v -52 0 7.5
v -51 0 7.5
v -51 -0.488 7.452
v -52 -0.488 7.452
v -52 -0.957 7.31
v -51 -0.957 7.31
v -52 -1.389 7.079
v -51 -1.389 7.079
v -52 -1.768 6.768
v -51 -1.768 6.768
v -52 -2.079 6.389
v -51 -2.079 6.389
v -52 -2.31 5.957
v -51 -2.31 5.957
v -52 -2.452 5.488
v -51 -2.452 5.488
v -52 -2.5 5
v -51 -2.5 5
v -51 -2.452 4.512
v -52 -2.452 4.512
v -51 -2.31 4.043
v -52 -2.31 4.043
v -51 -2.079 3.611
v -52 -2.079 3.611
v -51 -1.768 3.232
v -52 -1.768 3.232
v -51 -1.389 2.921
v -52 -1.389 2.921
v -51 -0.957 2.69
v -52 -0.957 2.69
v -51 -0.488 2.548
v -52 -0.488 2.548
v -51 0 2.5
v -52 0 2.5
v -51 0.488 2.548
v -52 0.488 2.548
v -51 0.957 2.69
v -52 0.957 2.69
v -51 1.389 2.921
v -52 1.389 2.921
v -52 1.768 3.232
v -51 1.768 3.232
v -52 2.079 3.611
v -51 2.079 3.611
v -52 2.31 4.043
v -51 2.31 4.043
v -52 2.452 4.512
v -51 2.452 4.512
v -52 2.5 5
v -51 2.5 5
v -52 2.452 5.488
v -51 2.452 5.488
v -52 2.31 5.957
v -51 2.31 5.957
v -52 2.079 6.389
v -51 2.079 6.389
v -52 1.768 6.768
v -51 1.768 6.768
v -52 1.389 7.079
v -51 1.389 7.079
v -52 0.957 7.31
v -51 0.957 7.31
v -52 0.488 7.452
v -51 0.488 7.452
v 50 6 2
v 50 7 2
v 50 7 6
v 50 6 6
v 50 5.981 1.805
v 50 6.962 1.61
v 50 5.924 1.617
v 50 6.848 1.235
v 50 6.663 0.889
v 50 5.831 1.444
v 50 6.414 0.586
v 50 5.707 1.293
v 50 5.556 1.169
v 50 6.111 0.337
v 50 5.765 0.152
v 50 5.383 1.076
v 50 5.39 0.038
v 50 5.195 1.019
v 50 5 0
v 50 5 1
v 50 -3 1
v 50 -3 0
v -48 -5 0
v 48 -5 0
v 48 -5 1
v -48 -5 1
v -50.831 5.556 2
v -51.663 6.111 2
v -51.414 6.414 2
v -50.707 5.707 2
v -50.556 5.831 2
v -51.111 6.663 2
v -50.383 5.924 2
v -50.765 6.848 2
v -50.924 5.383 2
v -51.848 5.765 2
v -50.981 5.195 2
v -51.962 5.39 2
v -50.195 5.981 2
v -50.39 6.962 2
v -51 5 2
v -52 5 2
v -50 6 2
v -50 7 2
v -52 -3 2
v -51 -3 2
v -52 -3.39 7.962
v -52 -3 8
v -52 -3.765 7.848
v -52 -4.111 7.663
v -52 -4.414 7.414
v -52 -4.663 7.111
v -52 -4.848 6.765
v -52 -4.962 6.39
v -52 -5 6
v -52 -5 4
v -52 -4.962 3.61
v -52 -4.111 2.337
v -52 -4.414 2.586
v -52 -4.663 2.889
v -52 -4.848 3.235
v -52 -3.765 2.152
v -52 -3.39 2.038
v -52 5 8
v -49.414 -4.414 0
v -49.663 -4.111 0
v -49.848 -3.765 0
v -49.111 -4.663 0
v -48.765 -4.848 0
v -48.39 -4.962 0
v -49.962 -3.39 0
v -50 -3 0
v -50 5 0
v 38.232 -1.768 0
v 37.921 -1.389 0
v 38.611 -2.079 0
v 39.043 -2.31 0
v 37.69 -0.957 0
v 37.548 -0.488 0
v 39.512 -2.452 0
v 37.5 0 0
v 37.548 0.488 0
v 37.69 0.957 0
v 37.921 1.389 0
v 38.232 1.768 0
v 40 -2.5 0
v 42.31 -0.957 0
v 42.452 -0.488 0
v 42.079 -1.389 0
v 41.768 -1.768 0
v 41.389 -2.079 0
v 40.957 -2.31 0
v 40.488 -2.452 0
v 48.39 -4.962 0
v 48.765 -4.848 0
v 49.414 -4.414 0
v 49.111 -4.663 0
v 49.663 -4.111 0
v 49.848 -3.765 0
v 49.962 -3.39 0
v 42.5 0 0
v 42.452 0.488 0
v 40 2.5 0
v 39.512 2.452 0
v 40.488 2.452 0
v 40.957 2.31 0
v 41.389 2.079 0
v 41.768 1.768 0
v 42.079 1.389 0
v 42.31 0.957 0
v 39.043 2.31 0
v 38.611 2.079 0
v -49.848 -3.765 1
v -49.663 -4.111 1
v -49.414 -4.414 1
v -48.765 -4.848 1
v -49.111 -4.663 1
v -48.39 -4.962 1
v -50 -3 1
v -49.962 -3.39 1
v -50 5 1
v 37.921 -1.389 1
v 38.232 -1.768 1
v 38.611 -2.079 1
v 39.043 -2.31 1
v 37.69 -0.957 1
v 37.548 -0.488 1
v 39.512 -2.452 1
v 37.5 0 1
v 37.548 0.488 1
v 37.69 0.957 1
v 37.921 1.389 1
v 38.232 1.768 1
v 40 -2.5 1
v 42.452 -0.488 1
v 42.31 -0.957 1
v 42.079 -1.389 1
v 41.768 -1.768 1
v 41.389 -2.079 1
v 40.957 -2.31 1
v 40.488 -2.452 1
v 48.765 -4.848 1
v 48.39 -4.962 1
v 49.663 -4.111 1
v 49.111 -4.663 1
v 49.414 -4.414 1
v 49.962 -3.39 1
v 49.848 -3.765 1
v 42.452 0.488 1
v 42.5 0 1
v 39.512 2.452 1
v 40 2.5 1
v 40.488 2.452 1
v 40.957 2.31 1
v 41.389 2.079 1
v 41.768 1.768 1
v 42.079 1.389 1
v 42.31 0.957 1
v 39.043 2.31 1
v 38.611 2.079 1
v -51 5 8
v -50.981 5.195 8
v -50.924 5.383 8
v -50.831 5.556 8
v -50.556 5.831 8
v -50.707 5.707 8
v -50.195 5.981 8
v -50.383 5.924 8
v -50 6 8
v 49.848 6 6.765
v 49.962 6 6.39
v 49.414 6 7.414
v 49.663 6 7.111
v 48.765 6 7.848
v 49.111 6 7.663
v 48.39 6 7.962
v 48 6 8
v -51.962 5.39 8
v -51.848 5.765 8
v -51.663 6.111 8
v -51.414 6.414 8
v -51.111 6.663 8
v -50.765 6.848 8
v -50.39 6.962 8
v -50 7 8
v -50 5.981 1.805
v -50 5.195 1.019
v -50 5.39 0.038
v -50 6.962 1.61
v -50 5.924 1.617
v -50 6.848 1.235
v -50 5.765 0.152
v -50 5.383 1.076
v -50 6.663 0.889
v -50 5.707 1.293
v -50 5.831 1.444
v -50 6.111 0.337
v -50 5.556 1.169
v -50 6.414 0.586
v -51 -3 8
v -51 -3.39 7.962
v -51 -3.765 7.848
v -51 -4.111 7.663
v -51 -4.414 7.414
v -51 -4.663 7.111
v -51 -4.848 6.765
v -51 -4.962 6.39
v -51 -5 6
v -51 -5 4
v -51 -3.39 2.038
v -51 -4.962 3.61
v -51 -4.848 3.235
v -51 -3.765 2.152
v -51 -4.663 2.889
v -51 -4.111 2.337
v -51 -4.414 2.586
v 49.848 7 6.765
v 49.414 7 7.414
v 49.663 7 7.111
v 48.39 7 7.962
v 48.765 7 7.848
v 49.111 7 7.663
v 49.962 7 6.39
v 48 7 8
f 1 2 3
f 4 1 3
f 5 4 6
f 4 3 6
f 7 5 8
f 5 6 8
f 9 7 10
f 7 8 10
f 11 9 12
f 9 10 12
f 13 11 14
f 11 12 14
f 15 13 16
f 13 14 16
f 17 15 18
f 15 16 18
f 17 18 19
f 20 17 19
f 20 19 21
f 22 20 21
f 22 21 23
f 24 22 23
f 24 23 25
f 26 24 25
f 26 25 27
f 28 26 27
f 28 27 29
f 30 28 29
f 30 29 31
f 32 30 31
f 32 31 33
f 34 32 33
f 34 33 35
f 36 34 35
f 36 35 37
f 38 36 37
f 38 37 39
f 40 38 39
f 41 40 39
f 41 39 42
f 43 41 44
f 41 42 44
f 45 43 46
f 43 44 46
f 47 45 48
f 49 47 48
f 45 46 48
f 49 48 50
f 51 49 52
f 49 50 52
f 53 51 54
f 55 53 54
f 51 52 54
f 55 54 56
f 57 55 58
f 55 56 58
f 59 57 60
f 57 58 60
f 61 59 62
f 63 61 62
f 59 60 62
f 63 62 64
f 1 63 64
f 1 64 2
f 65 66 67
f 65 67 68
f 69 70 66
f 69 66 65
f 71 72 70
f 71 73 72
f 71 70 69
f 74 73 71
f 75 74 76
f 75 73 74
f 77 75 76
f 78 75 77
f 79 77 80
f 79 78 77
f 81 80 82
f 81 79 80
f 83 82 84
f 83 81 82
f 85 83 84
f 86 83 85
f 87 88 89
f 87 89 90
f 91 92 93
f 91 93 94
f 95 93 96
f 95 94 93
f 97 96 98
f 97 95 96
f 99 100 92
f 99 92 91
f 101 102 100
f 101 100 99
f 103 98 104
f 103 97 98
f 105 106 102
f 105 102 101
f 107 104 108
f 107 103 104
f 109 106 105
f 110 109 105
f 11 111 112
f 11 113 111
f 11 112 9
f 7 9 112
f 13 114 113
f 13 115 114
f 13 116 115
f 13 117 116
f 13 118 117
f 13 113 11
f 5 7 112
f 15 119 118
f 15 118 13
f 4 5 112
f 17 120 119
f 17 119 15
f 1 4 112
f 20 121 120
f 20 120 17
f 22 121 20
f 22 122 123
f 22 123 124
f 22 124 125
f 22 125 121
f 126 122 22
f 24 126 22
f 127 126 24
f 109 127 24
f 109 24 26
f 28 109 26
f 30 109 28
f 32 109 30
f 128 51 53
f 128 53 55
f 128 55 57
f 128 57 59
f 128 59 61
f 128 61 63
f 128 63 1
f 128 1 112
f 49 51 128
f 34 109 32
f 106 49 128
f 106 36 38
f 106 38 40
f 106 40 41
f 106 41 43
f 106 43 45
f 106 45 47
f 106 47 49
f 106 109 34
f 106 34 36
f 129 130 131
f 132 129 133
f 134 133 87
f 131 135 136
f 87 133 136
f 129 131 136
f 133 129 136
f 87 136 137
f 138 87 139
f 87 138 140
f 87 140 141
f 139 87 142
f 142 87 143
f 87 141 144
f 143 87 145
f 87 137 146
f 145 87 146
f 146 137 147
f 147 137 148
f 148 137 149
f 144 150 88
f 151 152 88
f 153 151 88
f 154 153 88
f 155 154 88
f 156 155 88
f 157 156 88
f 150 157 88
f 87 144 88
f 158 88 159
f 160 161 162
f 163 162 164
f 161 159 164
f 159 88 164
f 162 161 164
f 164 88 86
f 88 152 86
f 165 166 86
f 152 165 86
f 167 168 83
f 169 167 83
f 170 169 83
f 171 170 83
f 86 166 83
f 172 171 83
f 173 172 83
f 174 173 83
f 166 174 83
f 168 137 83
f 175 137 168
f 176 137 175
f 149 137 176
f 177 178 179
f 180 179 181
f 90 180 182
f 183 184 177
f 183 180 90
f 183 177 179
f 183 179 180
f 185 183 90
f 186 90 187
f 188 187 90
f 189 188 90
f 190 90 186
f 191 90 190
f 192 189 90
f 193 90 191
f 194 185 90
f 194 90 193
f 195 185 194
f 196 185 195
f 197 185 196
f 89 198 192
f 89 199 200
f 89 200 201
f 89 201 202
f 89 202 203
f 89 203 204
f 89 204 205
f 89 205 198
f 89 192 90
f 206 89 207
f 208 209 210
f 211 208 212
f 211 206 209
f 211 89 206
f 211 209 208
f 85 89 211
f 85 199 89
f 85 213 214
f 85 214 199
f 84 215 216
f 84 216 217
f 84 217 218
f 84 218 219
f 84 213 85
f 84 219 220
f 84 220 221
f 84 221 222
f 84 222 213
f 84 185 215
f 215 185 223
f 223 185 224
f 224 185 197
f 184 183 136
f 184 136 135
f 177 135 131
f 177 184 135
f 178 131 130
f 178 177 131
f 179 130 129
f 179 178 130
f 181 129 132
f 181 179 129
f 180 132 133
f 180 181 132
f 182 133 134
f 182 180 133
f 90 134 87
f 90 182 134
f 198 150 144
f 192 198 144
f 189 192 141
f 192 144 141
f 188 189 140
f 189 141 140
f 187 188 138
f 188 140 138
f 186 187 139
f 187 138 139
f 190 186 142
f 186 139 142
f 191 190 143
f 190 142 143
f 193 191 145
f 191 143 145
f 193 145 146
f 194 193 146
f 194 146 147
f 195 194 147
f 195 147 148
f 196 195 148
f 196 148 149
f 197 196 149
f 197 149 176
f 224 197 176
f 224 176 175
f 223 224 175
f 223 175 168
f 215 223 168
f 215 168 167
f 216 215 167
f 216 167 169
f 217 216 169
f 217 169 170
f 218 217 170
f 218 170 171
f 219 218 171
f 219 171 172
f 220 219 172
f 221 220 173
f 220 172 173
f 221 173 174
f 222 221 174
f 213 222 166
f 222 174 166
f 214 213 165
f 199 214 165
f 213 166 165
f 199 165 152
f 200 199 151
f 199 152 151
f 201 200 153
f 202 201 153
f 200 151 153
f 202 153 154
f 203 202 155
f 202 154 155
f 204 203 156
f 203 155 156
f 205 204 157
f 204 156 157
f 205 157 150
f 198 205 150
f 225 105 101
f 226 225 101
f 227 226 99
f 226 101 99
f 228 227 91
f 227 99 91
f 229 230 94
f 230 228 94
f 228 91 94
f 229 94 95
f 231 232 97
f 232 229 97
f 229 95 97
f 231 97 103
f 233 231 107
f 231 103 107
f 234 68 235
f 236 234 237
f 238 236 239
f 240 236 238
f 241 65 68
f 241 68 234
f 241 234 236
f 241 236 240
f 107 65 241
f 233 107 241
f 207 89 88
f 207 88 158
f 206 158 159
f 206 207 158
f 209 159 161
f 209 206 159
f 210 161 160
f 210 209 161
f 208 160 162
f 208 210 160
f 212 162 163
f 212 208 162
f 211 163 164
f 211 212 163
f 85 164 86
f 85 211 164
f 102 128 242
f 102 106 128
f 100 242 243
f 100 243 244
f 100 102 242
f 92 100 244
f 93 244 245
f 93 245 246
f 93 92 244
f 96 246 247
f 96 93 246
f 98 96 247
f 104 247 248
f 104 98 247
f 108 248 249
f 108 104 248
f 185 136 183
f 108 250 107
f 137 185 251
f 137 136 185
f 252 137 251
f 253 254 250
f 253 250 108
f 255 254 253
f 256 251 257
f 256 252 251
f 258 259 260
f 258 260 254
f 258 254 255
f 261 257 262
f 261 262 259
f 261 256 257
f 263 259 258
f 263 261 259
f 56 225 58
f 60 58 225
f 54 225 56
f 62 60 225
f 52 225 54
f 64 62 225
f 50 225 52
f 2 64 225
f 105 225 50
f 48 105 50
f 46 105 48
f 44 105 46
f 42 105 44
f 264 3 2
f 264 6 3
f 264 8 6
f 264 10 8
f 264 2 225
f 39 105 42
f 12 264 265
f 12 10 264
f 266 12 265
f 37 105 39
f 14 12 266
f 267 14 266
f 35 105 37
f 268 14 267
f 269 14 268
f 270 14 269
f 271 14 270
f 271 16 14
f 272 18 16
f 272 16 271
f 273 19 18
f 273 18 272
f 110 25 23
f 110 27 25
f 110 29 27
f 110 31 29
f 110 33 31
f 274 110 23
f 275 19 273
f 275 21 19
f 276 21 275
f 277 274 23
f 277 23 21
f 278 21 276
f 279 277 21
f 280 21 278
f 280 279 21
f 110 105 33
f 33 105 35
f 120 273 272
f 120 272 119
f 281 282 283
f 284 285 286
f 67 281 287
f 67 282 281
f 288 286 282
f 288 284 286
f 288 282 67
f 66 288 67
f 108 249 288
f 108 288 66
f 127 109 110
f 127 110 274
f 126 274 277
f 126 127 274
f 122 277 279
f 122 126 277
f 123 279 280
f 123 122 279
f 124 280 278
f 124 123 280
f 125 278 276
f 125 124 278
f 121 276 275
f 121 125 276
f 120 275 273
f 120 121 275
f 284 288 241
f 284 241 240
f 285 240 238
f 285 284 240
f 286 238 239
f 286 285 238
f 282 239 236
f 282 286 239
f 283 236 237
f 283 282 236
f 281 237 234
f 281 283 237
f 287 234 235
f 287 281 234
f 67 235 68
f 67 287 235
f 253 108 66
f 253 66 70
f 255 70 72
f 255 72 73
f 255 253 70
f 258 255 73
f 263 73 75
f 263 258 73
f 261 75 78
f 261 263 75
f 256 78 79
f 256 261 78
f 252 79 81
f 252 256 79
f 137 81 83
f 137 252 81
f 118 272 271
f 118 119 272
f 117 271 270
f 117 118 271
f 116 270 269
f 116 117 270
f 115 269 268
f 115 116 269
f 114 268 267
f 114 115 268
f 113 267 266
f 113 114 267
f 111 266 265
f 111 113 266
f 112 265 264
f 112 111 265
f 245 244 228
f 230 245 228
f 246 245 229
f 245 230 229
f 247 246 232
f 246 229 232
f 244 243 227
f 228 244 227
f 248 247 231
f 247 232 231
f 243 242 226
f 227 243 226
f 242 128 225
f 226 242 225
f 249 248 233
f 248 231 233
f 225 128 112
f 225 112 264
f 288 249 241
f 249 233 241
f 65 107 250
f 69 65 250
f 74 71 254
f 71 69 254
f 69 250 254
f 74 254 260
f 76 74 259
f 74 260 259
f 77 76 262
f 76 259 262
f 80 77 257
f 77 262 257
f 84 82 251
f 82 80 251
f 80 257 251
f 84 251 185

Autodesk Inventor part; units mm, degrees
ref_plane "YZ Plane" through (0, 0, 0) normal (1, 0, 0) x (0, 1, 0)
ref_plane "XZ Plane" through (0, 0, 0) normal (0, 1, 0) x (-1, 0, 0)
ref_plane "XY Plane" through (0, 0, 0) normal (0, 0, 1) x (1, 0, 0)
sketch "Schizzo9" plane through (0, 0, 0) normal (0, 0, 1) x (1, 0, 0)
  line L0 (-50, 5) -> (50, 5)
  line L1 (50, 5) -> (50, -5)
  line L2 (50, -5) -> (-50, -5)
  line L3 (-50, -5) -> (-50, 5)
  line L4 (-50, 5) -> (50, -5) construction
  line L5 (50, 5) -> (-50, -5) construction
  point P0 (0, 0)
  dimension "d87" = 100
  dimension "d88" = 10
extrude "Piano6" add sketch "Schizzo9" along normal blind 1
sketch "Schizzo19" plane through (-50, 6, 2) normal (0, 1, 0) x (-1, 0, 0)
  line L0 (-100, 0) -> (0, 0)
  line L1 (0, 0) -> (0, 6)
  line L2 (0, 6) -> (-100, 6)
  line L3 (-100, 6) -> (-100, 0)
edge flange "Flangia9" height 8 angle 90 thickness 1 bend radius 1 thickness toward (0, 1, 0) relief tear relief width 1 relief depth 0.5 edges at (0, 5, 1) wall of the first edge with corners at (50, 6, 2) (-50, 6, 2) (-50, 6, 8) (50, 6, 8)
bend "Piega (Bend)9"
corner "Angolo9"
sketch "Schizzo20" plane through (-51, 5, 2) normal (-1, 0, 0) x (0, -1, 0)
  line L0 (0, 6) -> (0, 0)
  line L1 (0, 0) -> (10, 0)
  line L2 (10, 0) -> (10, 6)
  line L3 (10, 6) -> (0, 6)
edge flange "Flangia10" height 12 angle 90 thickness 1 bend radius 1 thickness toward (-1, 0, 0) relief tear relief width 1 relief depth 0.5 edges at (-50, 6, 5) wall of the first edge with corners at (-51, 5, 8) (-51, 5, 2) (-51, -5, 2) (-51, -5, 8)
bend "Piega (Bend)10"
corner "Angolo10"
sketch "Schizzo21" plane through (0, 0, 1) normal (0, 0, 1) x (1, 0, 0)
  line L0 (50, 5) -> (50, -5) projected
  point P0 (0, 0)
  point P1 (40, 0)
  point P2 (50, 0)
  dimension "d202" = 10
hole "Foro7" at (40, 0, 1) direction (0, 0, -1) diameter 5 end through all
fillet "Arrotondamento angolo7" radius 2 5 edges at (50, 6.5, 8) (50, -5, 0.5) (-50, -5, 0.5) (-51.5, -5, 2) (-51.5, -5, 8)
sketch "Schizzo22" plane through (-52, 5, 2) normal (-1, 0, 0) x (0, 0, 1)
  line L0 (6, 0) -> (6, -8) projected
  line L1 (4, -10) -> (2, -10) projected
  point P0 (-2, -5)
  point P1 (3, -5)
  point P2 (3, -10)
hole "Foro8" at (-52, 0, 5) direction (1, 0, 0) diameter 5 end through all
equation "\"d208\" = Spessore"
equation "\"d217\" = Spessore"
equation "\"d89\" = Spessore"
equation "\"d182\" = LarghezzaScaricoPiega"
equation "\"d183\" = ProfonditàScaricoPiega"
equation "\"d184\" = ResiduoMinimo"
equation "\"d185\" = RaggioTransizione"
equation "\"d188\" = RaggioPiega"
equation "\"d189\" = DimensioniScaricoAngolo"
equation "\"d190\" = DimensioneGioco"
equation "\"d191\" = Dimensione_raggio_Jacobi"
equation "\"d192\" = LarghezzaScaricoPiega"
equation "\"d193\" = ProfonditàScaricoPiega"
equation "\"d194\" = ResiduoMinimo"
equation "\"d195\" = RaggioTransizione"
equation "\"d198\" = RaggioPiega"
equation "\"d199\" = DimensioniScaricoAngolo"
equation "\"d200\" = DimensioneGioco"
equation "\"d201\" = Dimensione_raggio_Jacobi"
equation "\"RaggioPiega\" = Spessore"
equation "\"LarghezzaScaricoPiega\" = Spessore"
equation "\"ProfonditàScaricoPiega\" = 0.5 * Spessore"
equation "\"DimensioniScaricoAngolo\" = 4 * Spessore"
equation "\"ResiduoMinimo\" = 2 * Spessore"
equation "\"RaggioTransizione\" = RaggioPiega"
equation "\"Dimensione_raggio_Jacobi\" = RaggioPiega"
equation "\"DimensioneGioco\" = Spessore"
equation "\"Spessore\" = 1"
properties part number "Lamiera pistone scarico"
